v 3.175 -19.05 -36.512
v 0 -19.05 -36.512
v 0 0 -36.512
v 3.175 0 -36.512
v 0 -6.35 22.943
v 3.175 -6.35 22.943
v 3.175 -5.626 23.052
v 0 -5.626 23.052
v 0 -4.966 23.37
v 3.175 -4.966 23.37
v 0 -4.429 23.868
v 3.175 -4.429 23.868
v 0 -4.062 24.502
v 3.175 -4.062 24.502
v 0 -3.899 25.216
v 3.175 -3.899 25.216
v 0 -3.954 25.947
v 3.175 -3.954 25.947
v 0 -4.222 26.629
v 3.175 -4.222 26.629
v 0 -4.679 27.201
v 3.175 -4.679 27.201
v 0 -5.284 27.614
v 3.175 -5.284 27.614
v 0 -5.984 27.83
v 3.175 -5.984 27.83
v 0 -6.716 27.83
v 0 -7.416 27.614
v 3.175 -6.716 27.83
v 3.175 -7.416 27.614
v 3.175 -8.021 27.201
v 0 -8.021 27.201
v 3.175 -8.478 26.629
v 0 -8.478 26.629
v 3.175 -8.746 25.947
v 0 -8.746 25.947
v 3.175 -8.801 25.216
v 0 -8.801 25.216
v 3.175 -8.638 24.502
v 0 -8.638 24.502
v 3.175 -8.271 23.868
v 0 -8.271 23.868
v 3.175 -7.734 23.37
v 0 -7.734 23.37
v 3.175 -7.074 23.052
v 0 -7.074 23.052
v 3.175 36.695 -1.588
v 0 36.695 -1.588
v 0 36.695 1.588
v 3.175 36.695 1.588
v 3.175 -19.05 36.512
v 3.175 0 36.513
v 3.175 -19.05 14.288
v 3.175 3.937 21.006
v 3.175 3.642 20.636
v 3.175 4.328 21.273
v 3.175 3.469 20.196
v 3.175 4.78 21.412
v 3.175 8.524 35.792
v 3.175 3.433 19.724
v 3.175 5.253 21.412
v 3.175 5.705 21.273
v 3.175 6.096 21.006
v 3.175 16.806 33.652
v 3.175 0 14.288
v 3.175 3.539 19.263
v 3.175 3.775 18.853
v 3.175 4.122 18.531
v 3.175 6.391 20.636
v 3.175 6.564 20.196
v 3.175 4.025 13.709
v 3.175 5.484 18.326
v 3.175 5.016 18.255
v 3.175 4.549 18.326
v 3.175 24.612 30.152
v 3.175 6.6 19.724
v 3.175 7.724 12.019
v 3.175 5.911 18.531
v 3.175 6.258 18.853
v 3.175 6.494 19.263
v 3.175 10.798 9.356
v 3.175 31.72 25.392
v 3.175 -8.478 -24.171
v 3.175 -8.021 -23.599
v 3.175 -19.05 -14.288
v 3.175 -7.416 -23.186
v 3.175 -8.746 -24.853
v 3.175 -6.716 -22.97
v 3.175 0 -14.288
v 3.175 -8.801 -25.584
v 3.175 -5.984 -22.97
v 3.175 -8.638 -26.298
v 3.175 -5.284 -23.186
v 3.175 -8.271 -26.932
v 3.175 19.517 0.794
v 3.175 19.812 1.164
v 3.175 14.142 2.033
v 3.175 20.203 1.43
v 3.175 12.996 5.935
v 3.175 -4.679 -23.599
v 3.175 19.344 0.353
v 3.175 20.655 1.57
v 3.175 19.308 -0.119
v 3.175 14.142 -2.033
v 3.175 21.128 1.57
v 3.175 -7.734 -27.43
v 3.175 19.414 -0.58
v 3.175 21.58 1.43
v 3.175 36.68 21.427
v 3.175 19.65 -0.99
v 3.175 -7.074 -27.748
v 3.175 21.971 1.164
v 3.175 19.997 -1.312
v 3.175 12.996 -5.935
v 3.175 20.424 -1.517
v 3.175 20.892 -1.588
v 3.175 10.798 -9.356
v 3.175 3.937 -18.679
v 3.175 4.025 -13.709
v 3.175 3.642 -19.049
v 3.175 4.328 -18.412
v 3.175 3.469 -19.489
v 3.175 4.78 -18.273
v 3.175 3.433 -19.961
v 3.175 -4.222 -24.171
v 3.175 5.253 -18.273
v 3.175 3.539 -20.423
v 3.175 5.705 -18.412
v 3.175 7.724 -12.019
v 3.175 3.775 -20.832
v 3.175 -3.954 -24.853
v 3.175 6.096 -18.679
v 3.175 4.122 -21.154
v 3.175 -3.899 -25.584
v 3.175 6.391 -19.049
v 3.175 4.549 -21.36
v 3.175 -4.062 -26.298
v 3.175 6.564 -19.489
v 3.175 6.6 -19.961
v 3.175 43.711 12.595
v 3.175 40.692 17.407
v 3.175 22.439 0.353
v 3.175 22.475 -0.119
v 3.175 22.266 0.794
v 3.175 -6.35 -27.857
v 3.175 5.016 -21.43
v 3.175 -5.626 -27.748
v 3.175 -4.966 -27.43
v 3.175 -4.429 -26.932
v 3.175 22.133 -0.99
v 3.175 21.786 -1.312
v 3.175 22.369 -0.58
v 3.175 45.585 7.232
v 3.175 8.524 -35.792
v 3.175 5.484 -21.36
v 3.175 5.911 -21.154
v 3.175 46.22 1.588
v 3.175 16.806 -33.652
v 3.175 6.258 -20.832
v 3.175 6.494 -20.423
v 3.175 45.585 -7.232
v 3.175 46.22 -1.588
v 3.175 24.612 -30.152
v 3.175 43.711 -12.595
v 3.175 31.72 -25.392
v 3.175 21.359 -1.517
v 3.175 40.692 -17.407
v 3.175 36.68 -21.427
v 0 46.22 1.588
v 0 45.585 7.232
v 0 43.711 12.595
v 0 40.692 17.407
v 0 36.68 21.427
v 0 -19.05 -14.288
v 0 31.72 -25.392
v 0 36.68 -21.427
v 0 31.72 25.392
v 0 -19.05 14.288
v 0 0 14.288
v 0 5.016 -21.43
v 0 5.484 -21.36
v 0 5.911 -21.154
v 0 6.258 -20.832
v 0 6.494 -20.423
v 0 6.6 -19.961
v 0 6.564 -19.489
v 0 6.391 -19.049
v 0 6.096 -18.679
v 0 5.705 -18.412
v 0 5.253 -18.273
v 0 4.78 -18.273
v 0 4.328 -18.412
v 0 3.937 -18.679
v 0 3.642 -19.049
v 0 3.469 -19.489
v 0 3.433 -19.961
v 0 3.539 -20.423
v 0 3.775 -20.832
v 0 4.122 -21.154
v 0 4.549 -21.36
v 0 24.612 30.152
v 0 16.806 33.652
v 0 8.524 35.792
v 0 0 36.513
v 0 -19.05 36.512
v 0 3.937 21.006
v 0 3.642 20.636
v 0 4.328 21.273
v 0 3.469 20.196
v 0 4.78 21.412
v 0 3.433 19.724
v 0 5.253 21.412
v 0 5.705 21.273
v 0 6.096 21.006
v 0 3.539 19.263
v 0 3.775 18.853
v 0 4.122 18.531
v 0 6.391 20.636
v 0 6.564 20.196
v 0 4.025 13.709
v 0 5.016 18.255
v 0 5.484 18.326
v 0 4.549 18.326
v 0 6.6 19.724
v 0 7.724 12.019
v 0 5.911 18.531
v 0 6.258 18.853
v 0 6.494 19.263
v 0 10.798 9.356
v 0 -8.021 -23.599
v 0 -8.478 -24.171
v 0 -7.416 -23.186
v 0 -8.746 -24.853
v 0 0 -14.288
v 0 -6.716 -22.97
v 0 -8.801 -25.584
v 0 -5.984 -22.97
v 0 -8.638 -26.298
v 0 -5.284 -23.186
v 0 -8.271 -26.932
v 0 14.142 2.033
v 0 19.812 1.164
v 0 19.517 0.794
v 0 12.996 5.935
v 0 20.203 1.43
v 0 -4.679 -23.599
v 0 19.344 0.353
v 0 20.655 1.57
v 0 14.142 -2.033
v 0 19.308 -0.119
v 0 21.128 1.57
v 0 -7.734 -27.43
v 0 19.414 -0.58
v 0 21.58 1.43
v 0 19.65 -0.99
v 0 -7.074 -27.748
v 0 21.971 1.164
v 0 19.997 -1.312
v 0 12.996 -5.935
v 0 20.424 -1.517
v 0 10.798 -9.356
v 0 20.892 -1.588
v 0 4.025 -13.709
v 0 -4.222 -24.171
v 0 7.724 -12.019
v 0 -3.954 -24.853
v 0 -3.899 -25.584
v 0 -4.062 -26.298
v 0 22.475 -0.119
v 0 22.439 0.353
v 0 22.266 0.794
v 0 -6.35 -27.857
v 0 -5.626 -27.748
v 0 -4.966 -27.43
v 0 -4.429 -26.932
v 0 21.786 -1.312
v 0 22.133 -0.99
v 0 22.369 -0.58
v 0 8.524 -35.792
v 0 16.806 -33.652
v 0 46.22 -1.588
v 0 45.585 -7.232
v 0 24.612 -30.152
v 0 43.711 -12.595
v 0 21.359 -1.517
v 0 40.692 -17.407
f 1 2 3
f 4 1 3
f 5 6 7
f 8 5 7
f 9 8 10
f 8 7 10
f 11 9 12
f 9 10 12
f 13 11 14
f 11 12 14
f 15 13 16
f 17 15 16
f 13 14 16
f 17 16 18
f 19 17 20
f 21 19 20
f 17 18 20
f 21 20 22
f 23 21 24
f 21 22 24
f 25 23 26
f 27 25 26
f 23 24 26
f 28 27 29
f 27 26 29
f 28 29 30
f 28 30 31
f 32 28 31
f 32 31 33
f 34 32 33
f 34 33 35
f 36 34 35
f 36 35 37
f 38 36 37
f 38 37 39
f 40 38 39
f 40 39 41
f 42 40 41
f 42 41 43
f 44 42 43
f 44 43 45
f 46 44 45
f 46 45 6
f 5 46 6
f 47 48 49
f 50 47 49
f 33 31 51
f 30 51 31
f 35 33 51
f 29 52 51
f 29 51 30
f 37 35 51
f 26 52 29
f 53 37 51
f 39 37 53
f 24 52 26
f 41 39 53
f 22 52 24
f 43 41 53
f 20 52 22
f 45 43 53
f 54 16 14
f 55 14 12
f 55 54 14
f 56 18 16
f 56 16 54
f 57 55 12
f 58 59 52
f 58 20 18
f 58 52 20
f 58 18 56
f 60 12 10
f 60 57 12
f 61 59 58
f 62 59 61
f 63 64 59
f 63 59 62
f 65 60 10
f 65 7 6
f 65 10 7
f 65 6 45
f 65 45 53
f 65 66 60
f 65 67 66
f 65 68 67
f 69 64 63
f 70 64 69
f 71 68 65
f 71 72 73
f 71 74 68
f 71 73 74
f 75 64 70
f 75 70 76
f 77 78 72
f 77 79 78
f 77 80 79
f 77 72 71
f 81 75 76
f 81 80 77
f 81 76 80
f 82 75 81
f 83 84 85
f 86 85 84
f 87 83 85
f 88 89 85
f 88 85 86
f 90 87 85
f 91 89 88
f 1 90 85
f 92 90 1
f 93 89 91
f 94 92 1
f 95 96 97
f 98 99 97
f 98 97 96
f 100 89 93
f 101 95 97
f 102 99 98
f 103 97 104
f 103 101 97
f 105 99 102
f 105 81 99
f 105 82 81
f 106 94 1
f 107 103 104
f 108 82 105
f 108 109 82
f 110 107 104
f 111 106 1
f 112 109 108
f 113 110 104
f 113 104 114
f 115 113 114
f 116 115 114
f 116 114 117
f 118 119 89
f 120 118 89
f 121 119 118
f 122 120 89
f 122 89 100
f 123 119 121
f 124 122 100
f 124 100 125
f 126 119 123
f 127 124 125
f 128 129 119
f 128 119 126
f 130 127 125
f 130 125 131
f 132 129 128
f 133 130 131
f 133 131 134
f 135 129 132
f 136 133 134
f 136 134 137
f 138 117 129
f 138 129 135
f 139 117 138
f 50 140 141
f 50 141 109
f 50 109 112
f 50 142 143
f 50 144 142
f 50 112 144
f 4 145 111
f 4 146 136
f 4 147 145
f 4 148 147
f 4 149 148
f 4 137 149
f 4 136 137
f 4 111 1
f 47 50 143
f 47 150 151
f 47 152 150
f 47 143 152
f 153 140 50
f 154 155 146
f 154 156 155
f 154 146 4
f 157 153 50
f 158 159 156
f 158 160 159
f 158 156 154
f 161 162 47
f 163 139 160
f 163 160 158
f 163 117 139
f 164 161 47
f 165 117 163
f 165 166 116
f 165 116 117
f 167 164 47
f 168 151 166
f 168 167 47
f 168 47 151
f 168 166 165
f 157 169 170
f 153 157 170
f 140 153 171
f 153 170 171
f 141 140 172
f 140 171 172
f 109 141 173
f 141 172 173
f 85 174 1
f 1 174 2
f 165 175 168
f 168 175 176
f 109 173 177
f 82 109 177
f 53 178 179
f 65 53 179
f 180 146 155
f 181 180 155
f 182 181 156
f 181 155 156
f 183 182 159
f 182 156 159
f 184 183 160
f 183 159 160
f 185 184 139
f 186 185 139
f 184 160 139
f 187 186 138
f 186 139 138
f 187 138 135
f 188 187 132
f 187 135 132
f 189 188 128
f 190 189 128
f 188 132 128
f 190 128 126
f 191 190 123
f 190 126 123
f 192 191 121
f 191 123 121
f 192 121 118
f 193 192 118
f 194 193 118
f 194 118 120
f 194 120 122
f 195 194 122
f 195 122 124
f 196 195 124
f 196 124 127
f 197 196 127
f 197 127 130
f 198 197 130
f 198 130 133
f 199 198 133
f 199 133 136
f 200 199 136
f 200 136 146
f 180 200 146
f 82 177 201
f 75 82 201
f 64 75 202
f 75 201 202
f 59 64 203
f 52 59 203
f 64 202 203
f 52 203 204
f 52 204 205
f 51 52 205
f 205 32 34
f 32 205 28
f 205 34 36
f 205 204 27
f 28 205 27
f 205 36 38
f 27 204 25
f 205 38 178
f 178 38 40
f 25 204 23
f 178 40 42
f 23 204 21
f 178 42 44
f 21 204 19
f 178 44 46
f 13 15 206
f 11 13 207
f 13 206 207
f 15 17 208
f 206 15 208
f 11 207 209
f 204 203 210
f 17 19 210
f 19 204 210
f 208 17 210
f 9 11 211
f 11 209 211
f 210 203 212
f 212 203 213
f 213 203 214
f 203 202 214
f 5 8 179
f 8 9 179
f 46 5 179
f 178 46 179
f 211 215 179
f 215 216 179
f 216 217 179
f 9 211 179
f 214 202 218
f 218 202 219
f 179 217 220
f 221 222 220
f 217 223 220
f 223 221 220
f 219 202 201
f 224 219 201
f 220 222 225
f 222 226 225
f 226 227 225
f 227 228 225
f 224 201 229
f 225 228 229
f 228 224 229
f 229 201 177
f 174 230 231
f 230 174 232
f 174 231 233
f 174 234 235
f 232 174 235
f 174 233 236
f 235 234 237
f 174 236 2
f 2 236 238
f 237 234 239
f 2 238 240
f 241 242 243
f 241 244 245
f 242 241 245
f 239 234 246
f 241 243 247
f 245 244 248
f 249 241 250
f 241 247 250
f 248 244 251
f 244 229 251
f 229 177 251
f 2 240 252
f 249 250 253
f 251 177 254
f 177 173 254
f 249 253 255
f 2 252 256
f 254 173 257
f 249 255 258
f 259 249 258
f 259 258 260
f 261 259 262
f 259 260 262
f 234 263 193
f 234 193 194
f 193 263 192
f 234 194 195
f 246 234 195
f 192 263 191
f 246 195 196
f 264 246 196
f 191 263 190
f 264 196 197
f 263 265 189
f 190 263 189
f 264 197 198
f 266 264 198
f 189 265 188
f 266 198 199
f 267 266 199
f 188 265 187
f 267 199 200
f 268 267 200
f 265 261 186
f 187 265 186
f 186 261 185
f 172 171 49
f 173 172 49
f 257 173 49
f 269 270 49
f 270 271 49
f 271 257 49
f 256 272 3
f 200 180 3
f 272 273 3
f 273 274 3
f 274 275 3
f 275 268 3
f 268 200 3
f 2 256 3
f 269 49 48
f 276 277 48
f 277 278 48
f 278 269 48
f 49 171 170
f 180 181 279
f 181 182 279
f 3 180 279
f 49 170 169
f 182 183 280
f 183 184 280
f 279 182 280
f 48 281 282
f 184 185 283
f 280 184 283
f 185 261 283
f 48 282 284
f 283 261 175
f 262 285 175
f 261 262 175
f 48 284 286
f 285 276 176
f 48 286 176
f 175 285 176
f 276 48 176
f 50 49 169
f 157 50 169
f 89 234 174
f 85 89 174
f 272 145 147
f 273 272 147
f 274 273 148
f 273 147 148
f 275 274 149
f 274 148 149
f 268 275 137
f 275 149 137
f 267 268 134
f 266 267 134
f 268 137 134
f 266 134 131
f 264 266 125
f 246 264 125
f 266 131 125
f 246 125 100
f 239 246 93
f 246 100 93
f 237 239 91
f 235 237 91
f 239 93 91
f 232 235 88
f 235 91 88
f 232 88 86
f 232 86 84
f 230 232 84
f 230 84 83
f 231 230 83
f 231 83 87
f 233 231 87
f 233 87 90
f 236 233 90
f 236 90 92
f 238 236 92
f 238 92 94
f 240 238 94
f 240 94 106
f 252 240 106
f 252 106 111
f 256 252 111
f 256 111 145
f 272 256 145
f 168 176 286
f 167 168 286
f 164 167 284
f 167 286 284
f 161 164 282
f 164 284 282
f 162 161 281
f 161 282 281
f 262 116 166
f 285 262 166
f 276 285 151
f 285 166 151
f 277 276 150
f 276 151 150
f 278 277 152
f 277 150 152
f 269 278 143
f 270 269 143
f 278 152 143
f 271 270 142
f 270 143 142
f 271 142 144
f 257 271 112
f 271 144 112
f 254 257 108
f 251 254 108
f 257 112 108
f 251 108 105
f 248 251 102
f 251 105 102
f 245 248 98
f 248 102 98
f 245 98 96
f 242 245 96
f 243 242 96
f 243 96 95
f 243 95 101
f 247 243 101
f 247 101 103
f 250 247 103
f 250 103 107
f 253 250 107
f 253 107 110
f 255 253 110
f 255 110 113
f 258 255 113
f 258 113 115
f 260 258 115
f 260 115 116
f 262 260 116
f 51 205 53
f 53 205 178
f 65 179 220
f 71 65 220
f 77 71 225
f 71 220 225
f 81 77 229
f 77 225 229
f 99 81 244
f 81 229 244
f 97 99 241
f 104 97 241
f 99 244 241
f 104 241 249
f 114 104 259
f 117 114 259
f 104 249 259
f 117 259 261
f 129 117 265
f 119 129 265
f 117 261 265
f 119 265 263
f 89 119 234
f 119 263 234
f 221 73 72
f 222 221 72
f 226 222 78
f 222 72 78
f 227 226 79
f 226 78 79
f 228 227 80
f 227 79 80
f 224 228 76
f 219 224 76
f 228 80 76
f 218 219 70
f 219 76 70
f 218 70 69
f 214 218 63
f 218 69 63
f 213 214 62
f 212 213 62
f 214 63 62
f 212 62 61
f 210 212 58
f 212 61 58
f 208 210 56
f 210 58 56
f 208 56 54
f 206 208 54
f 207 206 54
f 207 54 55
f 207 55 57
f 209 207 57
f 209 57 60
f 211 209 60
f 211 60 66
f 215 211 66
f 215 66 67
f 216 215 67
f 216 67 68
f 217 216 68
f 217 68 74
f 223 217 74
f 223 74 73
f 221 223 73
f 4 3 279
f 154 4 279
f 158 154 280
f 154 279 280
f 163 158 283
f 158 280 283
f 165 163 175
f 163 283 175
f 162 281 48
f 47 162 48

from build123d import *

# Parameters (mm, degrees)
BOSS_EXTRUDE1_DEPTH              = 3.175
F_10_0_1935_DIAMETER_HOLE1_D     = 4.9149
F_10_0_1935_DIAMETER_HOLE1_DEPTH = 19.001994
F_10_0_1935_DIAMETER_HOLE1_TIP   = 1.476584928
SKETCH4_R                        = 1.5875
CUT_EXTRUDE1_DEPTH               = 59.987451342


with BuildPart() as part:
    # Sketch1 → Boss-Extrude1 (new body)
    with BuildSketch(Plane(origin=(0, 0, 0), x_dir=(0, 0, -1), z_dir=(1, 0, 0))):
        with BuildLine():
            Line((1.5875, 46.219867315), (1.5875, 36.694867315))
            Line((1.5875, 36.694867315), (-1.5875, 36.694867315))
            Line((-1.5875, 36.694867315), (-1.5875, 46.219867315))
            ThreePointArc((-1.5875, 46.219867315), (-12.594751518, 43.710922642), (-21.42746878, 36.679742434))
            Line((-21.42746878, 36.679742434), (-25.39243756, 31.719750239))
            ThreePointArc((-25.39243756, 31.719750239), (-33.651945283, 16.80623652), (-36.5125, 0))
            Line((-36.5125, 0), (-36.5125, -19.05))
            Line((-36.5125, -19.05), (-14.2875, -19.05))
            Line((-14.2875, -19.05), (-14.2875, 0))
            ThreePointArc((-14.2875, 0), (0, 14.2875), (14.2875, 0))
            Line((14.2875, 0), (14.2875, -19.05))
            Line((14.2875, -19.05), (36.5125, -19.05))
            Line((36.5125, -19.05), (36.5125, 0))
            ThreePointArc((36.5125, 0), (33.651945283, 16.80623652), (25.39243756, 31.719750239))
            Line((25.39243756, 31.719750239), (21.42746878, 36.679742434))
            ThreePointArc((21.42746878, 36.679742434), (12.594751518, 43.710922642), (1.5875, 46.219867315))
        make_face()
    extrude(amount=BOSS_EXTRUDE1_DEPTH)

    # #10 (0.1935) Diameter Hole1
    with Locations(Plane.ZY):
        with Locations((-25.4, -6.35), (25.4, -6.35)):
            Hole(F_10_0_1935_DIAMETER_HOLE1_D / 2, depth=F_10_0_1935_DIAMETER_HOLE1_DEPTH)
            with Locations((0, 0, -(F_10_0_1935_DIAMETER_HOLE1_DEPTH + F_10_0_1935_DIAMETER_HOLE1_TIP / 2))):  # 118° drill point
                Cone(0, F_10_0_1935_DIAMETER_HOLE1_D / 2, F_10_0_1935_DIAMETER_HOLE1_TIP, mode=Mode.SUBTRACT)

    # Sketch4 → Cut-Extrude1 (cut, through all)
    with BuildSketch(Plane(origin=(3.175, 0, 0), x_dir=(0, 0, -1), z_dir=(1, 0, 0))):
        with Locations((-19.842621022, 5.0165)):
            Circle(SKETCH4_R)
        with Locations((0, 20.8915)):
            Circle(SKETCH4_R)
        with Locations((19.842621022, 5.0165)):
            Circle(SKETCH4_R)
    extrude(amount=-CUT_EXTRUDE1_DEPTH, mode=Mode.SUBTRACT)


solid = part.part
